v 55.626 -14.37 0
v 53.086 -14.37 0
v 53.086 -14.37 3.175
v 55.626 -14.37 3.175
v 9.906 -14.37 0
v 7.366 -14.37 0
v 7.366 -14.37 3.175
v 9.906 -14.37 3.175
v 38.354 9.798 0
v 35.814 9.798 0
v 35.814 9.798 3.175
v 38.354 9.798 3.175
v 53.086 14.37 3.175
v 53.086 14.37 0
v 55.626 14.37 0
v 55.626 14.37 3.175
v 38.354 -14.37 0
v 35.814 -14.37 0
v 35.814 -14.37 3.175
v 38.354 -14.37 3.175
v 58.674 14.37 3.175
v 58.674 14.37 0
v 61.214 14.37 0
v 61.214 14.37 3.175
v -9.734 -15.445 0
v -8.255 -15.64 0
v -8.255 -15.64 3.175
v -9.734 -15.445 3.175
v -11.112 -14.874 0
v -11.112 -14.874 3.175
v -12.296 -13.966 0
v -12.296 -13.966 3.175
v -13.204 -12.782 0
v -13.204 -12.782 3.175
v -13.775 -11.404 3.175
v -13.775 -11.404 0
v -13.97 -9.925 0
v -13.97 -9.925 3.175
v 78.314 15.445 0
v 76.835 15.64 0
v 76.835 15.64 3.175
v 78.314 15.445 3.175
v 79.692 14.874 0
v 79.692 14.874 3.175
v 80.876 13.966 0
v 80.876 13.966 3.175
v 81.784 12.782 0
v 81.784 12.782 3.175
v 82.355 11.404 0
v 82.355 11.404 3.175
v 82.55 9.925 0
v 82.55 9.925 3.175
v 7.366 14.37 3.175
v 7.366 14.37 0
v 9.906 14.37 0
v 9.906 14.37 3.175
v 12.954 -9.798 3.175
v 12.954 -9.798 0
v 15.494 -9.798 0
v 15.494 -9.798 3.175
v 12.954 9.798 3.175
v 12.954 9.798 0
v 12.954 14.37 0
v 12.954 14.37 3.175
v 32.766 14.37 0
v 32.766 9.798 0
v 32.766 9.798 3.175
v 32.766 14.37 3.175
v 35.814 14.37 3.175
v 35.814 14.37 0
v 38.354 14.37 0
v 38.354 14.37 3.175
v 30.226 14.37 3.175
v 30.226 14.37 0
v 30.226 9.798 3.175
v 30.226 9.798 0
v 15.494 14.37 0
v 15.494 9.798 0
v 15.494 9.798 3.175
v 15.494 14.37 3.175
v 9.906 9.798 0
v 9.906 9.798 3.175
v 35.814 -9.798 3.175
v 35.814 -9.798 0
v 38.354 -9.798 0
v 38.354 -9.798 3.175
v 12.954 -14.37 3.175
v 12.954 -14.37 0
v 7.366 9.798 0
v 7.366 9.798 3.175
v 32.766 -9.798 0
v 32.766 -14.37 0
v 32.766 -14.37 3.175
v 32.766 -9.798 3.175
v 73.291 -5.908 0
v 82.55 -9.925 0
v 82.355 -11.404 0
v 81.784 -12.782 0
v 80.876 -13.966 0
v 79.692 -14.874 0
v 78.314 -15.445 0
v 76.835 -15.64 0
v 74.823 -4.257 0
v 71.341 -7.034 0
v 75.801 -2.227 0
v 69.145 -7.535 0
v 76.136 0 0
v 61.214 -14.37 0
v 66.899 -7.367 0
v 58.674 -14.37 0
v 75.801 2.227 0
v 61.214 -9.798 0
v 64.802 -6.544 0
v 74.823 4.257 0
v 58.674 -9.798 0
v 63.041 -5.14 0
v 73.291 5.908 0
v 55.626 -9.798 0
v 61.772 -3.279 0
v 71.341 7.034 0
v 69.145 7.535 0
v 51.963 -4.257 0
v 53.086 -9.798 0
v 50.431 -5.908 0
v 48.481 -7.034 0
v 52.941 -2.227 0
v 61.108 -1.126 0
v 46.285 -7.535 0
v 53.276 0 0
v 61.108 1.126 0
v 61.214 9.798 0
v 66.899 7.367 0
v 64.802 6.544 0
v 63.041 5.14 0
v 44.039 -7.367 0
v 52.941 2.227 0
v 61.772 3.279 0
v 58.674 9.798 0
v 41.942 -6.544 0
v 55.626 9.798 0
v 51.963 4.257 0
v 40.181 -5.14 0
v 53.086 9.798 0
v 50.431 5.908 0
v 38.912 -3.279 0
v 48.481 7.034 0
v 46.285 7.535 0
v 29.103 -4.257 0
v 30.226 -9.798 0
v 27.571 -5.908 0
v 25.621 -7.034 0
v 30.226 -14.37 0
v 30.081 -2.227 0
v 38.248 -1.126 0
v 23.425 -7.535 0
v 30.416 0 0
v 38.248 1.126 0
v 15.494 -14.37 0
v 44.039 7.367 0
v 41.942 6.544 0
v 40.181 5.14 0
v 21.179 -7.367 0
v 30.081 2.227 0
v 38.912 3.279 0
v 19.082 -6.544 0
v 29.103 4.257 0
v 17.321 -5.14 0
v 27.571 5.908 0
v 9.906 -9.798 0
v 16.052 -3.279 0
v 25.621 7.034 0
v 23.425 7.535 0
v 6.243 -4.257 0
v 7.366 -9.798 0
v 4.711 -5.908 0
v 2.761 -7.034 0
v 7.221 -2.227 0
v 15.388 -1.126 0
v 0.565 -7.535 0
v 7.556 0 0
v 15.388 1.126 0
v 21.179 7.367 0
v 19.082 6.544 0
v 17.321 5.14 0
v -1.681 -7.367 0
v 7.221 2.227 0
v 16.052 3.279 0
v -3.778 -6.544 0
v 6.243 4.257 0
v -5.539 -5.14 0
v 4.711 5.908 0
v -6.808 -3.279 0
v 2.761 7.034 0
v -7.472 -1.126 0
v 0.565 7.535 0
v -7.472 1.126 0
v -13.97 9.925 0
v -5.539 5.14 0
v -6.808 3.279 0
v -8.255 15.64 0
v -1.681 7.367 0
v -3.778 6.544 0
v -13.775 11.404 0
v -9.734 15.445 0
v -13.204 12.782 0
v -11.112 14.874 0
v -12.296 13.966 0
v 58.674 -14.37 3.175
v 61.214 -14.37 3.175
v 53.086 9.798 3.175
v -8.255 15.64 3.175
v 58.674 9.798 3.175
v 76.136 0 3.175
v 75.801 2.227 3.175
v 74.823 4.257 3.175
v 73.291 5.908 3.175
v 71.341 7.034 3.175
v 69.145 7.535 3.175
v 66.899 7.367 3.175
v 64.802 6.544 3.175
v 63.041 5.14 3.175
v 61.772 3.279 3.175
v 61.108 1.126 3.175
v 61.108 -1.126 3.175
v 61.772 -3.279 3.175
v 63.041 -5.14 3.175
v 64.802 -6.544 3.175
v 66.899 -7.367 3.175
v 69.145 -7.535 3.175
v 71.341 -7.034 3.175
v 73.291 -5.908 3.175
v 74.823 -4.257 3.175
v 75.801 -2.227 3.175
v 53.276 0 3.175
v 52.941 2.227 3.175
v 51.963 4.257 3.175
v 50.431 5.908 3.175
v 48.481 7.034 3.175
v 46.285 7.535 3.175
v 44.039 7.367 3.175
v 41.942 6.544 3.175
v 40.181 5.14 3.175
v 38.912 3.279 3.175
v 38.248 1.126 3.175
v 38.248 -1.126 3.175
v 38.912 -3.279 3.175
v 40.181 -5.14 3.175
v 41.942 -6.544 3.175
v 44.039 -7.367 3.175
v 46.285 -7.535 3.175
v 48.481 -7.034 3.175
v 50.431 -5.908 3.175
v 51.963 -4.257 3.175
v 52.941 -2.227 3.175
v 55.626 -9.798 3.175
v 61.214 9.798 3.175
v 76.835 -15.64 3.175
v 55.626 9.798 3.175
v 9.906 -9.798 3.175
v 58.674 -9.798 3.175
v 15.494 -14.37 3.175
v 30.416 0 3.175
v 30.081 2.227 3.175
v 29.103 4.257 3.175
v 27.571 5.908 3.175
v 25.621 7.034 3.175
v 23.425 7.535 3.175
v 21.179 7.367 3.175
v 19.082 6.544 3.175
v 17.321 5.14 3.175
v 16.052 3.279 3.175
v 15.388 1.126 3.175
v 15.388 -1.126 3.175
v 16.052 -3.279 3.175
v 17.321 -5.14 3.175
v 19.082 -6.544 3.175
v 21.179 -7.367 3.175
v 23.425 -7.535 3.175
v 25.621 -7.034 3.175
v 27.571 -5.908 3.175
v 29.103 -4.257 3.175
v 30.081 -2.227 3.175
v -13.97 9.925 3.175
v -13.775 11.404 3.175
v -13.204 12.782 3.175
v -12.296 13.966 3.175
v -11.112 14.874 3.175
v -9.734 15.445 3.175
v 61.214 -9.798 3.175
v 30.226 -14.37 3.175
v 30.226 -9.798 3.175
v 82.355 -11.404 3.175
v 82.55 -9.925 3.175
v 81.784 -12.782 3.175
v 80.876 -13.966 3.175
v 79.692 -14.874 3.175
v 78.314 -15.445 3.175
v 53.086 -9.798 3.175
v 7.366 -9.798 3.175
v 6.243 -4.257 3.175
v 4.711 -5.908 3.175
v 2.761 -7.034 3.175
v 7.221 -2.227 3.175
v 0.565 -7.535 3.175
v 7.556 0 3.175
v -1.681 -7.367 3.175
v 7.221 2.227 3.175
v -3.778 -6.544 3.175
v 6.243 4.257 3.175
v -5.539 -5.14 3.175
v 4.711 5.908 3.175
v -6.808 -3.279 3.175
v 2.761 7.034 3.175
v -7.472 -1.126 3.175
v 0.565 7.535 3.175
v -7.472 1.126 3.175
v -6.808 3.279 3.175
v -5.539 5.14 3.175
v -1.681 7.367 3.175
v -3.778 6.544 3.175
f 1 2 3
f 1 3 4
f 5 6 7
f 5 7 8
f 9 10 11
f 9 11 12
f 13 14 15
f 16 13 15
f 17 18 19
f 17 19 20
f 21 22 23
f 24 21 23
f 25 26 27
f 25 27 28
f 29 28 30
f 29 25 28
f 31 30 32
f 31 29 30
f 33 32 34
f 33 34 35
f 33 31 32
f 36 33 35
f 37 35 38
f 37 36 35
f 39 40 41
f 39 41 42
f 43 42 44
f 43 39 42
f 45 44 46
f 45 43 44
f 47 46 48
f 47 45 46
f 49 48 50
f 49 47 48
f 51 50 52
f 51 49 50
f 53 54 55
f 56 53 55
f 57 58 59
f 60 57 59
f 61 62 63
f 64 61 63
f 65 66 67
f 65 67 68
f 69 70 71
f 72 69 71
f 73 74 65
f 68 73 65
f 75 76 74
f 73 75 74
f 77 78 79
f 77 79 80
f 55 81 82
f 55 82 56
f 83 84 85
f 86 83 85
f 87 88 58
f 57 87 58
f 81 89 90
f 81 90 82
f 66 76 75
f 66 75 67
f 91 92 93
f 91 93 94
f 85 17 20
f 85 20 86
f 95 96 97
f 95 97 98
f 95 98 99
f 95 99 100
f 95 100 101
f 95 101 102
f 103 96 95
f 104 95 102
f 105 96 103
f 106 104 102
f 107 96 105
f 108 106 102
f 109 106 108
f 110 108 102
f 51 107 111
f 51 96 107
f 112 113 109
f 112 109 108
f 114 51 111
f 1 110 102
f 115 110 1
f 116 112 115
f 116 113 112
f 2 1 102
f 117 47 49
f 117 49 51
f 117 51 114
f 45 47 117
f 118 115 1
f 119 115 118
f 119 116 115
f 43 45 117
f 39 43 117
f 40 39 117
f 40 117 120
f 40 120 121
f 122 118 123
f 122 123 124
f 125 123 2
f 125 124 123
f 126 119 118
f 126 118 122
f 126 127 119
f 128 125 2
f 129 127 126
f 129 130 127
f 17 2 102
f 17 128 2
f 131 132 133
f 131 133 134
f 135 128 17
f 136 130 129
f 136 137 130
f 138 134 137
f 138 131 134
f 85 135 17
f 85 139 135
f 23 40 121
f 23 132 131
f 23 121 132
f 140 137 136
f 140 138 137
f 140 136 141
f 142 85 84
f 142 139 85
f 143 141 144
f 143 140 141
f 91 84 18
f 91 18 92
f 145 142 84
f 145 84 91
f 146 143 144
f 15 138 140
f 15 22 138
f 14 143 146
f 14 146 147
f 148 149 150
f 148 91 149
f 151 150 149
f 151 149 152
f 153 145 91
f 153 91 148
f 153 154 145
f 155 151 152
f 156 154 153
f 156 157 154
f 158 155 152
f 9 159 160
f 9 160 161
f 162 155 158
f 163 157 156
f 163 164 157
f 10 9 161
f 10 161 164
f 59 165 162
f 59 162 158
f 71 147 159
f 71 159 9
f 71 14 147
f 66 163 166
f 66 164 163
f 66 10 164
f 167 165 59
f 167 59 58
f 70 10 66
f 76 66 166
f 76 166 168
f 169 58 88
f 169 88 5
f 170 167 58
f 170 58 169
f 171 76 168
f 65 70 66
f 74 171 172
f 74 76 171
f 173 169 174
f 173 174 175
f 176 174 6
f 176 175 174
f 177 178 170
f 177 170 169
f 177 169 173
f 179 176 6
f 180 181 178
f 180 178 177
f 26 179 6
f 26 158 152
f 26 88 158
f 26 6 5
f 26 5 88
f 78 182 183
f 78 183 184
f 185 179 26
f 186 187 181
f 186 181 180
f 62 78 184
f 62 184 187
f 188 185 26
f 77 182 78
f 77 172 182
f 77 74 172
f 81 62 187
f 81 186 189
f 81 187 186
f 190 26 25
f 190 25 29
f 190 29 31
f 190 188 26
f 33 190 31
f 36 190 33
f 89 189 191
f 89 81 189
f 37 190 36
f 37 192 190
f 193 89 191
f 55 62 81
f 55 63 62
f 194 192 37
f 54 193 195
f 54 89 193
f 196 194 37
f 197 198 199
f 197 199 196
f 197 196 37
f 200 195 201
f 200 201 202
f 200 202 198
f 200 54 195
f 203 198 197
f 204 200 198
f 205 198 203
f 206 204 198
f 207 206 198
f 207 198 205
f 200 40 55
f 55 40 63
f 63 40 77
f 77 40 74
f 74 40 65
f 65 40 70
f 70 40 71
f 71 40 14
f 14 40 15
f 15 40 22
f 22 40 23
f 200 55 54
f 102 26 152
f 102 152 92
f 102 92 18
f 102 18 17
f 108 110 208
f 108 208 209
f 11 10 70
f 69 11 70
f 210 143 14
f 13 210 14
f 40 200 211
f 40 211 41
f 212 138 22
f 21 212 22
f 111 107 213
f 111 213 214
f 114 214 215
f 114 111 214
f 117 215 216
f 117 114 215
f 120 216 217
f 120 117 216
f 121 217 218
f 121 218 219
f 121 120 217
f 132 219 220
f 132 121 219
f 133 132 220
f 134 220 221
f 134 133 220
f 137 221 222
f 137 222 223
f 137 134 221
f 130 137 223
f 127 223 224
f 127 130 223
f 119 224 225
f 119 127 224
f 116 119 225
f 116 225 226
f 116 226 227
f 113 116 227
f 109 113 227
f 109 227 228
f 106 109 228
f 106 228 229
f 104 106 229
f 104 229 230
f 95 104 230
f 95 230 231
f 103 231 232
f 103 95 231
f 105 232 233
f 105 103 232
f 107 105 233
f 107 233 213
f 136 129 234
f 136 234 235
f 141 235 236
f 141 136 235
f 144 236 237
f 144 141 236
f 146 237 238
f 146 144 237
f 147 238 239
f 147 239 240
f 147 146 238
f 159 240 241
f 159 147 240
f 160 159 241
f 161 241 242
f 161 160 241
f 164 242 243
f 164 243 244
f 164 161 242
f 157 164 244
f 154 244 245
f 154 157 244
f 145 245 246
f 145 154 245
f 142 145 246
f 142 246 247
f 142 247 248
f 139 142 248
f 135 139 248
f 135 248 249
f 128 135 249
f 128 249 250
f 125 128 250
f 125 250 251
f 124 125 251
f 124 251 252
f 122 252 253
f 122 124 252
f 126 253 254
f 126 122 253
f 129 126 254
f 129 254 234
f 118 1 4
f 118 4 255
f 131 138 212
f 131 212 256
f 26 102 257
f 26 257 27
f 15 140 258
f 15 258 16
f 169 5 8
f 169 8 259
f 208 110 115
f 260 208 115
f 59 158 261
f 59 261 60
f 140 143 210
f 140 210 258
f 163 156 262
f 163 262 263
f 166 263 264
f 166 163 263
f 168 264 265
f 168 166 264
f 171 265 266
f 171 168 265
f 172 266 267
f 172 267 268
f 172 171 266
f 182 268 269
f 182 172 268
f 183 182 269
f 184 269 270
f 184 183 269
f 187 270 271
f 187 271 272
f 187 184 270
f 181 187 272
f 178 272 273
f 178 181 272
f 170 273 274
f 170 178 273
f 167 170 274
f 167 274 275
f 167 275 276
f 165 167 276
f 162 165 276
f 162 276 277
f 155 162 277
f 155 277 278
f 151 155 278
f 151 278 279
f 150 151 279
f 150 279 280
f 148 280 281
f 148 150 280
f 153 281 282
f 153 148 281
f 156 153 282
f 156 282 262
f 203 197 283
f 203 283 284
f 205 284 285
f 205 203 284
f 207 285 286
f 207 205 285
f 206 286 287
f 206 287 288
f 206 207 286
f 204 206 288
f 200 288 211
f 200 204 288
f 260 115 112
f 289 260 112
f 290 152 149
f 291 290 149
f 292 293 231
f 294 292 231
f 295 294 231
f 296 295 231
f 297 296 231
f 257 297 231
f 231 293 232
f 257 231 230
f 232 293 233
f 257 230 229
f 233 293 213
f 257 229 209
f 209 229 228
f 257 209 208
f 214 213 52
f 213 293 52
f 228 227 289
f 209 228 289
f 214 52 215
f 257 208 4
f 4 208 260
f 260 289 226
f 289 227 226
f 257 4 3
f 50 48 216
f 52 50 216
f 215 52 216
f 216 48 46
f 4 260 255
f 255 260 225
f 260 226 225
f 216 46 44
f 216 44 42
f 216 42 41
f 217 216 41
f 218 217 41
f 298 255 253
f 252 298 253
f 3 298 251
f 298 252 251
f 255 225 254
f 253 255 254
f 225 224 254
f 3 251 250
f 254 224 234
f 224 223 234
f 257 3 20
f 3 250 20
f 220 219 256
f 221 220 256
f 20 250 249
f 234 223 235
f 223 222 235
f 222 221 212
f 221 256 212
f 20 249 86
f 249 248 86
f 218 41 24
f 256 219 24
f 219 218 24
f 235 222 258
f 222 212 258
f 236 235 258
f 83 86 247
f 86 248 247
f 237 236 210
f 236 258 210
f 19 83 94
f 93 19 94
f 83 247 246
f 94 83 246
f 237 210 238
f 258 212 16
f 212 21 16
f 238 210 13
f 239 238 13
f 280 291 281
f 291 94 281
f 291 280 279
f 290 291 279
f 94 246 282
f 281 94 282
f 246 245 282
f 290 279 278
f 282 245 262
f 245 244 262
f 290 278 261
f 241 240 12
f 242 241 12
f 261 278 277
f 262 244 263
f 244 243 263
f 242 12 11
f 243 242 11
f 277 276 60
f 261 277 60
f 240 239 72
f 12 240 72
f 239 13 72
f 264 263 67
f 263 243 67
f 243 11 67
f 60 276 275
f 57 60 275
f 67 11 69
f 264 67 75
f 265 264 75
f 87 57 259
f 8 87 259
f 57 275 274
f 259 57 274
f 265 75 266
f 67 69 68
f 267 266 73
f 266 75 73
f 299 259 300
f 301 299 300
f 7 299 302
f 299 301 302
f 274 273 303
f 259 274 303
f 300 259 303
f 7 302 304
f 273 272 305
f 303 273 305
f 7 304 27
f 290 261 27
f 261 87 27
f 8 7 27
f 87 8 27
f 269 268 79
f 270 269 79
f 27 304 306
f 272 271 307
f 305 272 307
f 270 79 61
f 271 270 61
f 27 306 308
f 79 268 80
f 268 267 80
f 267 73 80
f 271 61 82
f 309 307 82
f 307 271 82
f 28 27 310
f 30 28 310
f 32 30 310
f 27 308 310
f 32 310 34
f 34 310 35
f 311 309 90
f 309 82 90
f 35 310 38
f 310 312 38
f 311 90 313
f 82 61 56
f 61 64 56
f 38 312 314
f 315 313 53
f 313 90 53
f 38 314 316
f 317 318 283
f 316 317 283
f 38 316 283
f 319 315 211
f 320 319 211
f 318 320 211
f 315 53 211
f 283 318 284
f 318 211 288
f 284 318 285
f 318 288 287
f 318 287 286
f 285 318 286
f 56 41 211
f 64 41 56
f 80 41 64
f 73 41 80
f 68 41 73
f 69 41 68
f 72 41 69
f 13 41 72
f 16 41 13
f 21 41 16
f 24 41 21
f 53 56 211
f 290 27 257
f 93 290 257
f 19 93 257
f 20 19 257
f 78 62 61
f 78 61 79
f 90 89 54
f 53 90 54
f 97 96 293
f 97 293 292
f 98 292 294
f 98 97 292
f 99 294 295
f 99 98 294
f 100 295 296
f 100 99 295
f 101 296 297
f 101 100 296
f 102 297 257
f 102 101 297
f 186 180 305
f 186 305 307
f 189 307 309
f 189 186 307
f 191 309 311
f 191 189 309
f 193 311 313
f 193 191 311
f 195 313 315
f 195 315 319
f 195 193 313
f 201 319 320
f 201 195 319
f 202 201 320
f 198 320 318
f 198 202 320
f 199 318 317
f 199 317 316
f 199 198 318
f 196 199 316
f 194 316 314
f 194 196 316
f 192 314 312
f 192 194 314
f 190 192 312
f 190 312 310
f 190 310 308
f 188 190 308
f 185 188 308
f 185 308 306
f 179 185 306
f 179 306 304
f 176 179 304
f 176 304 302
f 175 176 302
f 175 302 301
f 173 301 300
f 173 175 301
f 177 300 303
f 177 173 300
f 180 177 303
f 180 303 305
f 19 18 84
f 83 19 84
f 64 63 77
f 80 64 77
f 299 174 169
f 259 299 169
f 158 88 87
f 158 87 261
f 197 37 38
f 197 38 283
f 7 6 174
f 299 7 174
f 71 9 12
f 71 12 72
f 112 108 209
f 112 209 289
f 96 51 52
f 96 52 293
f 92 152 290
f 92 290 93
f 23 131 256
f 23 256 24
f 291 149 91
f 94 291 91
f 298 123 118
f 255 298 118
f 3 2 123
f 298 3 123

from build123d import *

# Parameters (mm, degrees)
SKETCH1_R           = 7.5565
SKETCH1_W           = 2.54
SKETCH1_H           = 4.572
BOSS_EXTRUDE1_DEPTH = 3.175


with BuildPart() as part:
    # Sketch1 → Boss-Extrude1 (new body)
    with BuildSketch(Plane.XY):
        with BuildLine():
            Line((-8.255, 15.639992312), (76.835, 15.639992312))
            ThreePointArc((76.835, 15.639992312), (80.876115254, 13.966107566), (82.55, 9.924992312))
            Line((82.55, 9.924992312), (82.55, -9.924992312))
            ThreePointArc((82.55, -9.924992312), (80.876115254, -13.966107566), (76.835, -15.639992312))
            Line((76.835, -15.639992312), (-8.255, -15.639992312))
            ThreePointArc((-8.255, -15.639992312), (-12.296115254, -13.966107566), (-13.97, -9.924992312))
            Line((-13.97, -9.924992312), (-13.97, 9.924992312))
            ThreePointArc((-13.97, 9.924992312), (-12.296115254, 13.966107566), (-8.255, 15.639992312))
        make_face()
        Circle(SKETCH1_R, mode=Mode.SUBTRACT)
        with Locations((22.86, 0)):
            Circle(SKETCH1_R, mode=Mode.SUBTRACT)
        with Locations((45.72, 0)):
            Circle(SKETCH1_R, mode=Mode.SUBTRACT)
        with Locations((68.58, 0)):
            Circle(SKETCH1_R, mode=Mode.SUBTRACT)
        with Locations((8.636, 12.083992312)):
            Rectangle(SKETCH1_W, SKETCH1_H, mode=Mode.SUBTRACT)
        with Locations((14.224, 12.083992312)):
            Rectangle(SKETCH1_W, SKETCH1_H, mode=Mode.SUBTRACT)
        with Locations((31.496, 12.083992312)):
            Rectangle(SKETCH1_W, SKETCH1_H, mode=Mode.SUBTRACT)
        with Locations((37.084, 12.083992312)):
            Rectangle(SKETCH1_W, SKETCH1_H, mode=Mode.SUBTRACT)
        with Locations((54.356, 12.083992312)):
            Rectangle(SKETCH1_W, SKETCH1_H, mode=Mode.SUBTRACT)
        with Locations((59.944, 12.083992312)):
            Rectangle(SKETCH1_W, SKETCH1_H, mode=Mode.SUBTRACT)
        with Locations((59.944, -12.083992312)):
            Rectangle(SKETCH1_W, SKETCH1_H, mode=Mode.SUBTRACT)
        with Locations((54.356, -12.083992312)):
            Rectangle(SKETCH1_W, SKETCH1_H, mode=Mode.SUBTRACT)
        with Locations((37.084, -12.083992312)):
            Rectangle(SKETCH1_W, SKETCH1_H, mode=Mode.SUBTRACT)
        with Locations((31.496, -12.083992312)):
            Rectangle(SKETCH1_W, SKETCH1_H, mode=Mode.SUBTRACT)
        with Locations((14.224, -12.083992312)):
            Rectangle(SKETCH1_W, SKETCH1_H, mode=Mode.SUBTRACT)
        with Locations((8.636, -12.083992312)):
            Rectangle(SKETCH1_W, SKETCH1_H, mode=Mode.SUBTRACT)
    extrude(amount=BOSS_EXTRUDE1_DEPTH)


solid = part.part
